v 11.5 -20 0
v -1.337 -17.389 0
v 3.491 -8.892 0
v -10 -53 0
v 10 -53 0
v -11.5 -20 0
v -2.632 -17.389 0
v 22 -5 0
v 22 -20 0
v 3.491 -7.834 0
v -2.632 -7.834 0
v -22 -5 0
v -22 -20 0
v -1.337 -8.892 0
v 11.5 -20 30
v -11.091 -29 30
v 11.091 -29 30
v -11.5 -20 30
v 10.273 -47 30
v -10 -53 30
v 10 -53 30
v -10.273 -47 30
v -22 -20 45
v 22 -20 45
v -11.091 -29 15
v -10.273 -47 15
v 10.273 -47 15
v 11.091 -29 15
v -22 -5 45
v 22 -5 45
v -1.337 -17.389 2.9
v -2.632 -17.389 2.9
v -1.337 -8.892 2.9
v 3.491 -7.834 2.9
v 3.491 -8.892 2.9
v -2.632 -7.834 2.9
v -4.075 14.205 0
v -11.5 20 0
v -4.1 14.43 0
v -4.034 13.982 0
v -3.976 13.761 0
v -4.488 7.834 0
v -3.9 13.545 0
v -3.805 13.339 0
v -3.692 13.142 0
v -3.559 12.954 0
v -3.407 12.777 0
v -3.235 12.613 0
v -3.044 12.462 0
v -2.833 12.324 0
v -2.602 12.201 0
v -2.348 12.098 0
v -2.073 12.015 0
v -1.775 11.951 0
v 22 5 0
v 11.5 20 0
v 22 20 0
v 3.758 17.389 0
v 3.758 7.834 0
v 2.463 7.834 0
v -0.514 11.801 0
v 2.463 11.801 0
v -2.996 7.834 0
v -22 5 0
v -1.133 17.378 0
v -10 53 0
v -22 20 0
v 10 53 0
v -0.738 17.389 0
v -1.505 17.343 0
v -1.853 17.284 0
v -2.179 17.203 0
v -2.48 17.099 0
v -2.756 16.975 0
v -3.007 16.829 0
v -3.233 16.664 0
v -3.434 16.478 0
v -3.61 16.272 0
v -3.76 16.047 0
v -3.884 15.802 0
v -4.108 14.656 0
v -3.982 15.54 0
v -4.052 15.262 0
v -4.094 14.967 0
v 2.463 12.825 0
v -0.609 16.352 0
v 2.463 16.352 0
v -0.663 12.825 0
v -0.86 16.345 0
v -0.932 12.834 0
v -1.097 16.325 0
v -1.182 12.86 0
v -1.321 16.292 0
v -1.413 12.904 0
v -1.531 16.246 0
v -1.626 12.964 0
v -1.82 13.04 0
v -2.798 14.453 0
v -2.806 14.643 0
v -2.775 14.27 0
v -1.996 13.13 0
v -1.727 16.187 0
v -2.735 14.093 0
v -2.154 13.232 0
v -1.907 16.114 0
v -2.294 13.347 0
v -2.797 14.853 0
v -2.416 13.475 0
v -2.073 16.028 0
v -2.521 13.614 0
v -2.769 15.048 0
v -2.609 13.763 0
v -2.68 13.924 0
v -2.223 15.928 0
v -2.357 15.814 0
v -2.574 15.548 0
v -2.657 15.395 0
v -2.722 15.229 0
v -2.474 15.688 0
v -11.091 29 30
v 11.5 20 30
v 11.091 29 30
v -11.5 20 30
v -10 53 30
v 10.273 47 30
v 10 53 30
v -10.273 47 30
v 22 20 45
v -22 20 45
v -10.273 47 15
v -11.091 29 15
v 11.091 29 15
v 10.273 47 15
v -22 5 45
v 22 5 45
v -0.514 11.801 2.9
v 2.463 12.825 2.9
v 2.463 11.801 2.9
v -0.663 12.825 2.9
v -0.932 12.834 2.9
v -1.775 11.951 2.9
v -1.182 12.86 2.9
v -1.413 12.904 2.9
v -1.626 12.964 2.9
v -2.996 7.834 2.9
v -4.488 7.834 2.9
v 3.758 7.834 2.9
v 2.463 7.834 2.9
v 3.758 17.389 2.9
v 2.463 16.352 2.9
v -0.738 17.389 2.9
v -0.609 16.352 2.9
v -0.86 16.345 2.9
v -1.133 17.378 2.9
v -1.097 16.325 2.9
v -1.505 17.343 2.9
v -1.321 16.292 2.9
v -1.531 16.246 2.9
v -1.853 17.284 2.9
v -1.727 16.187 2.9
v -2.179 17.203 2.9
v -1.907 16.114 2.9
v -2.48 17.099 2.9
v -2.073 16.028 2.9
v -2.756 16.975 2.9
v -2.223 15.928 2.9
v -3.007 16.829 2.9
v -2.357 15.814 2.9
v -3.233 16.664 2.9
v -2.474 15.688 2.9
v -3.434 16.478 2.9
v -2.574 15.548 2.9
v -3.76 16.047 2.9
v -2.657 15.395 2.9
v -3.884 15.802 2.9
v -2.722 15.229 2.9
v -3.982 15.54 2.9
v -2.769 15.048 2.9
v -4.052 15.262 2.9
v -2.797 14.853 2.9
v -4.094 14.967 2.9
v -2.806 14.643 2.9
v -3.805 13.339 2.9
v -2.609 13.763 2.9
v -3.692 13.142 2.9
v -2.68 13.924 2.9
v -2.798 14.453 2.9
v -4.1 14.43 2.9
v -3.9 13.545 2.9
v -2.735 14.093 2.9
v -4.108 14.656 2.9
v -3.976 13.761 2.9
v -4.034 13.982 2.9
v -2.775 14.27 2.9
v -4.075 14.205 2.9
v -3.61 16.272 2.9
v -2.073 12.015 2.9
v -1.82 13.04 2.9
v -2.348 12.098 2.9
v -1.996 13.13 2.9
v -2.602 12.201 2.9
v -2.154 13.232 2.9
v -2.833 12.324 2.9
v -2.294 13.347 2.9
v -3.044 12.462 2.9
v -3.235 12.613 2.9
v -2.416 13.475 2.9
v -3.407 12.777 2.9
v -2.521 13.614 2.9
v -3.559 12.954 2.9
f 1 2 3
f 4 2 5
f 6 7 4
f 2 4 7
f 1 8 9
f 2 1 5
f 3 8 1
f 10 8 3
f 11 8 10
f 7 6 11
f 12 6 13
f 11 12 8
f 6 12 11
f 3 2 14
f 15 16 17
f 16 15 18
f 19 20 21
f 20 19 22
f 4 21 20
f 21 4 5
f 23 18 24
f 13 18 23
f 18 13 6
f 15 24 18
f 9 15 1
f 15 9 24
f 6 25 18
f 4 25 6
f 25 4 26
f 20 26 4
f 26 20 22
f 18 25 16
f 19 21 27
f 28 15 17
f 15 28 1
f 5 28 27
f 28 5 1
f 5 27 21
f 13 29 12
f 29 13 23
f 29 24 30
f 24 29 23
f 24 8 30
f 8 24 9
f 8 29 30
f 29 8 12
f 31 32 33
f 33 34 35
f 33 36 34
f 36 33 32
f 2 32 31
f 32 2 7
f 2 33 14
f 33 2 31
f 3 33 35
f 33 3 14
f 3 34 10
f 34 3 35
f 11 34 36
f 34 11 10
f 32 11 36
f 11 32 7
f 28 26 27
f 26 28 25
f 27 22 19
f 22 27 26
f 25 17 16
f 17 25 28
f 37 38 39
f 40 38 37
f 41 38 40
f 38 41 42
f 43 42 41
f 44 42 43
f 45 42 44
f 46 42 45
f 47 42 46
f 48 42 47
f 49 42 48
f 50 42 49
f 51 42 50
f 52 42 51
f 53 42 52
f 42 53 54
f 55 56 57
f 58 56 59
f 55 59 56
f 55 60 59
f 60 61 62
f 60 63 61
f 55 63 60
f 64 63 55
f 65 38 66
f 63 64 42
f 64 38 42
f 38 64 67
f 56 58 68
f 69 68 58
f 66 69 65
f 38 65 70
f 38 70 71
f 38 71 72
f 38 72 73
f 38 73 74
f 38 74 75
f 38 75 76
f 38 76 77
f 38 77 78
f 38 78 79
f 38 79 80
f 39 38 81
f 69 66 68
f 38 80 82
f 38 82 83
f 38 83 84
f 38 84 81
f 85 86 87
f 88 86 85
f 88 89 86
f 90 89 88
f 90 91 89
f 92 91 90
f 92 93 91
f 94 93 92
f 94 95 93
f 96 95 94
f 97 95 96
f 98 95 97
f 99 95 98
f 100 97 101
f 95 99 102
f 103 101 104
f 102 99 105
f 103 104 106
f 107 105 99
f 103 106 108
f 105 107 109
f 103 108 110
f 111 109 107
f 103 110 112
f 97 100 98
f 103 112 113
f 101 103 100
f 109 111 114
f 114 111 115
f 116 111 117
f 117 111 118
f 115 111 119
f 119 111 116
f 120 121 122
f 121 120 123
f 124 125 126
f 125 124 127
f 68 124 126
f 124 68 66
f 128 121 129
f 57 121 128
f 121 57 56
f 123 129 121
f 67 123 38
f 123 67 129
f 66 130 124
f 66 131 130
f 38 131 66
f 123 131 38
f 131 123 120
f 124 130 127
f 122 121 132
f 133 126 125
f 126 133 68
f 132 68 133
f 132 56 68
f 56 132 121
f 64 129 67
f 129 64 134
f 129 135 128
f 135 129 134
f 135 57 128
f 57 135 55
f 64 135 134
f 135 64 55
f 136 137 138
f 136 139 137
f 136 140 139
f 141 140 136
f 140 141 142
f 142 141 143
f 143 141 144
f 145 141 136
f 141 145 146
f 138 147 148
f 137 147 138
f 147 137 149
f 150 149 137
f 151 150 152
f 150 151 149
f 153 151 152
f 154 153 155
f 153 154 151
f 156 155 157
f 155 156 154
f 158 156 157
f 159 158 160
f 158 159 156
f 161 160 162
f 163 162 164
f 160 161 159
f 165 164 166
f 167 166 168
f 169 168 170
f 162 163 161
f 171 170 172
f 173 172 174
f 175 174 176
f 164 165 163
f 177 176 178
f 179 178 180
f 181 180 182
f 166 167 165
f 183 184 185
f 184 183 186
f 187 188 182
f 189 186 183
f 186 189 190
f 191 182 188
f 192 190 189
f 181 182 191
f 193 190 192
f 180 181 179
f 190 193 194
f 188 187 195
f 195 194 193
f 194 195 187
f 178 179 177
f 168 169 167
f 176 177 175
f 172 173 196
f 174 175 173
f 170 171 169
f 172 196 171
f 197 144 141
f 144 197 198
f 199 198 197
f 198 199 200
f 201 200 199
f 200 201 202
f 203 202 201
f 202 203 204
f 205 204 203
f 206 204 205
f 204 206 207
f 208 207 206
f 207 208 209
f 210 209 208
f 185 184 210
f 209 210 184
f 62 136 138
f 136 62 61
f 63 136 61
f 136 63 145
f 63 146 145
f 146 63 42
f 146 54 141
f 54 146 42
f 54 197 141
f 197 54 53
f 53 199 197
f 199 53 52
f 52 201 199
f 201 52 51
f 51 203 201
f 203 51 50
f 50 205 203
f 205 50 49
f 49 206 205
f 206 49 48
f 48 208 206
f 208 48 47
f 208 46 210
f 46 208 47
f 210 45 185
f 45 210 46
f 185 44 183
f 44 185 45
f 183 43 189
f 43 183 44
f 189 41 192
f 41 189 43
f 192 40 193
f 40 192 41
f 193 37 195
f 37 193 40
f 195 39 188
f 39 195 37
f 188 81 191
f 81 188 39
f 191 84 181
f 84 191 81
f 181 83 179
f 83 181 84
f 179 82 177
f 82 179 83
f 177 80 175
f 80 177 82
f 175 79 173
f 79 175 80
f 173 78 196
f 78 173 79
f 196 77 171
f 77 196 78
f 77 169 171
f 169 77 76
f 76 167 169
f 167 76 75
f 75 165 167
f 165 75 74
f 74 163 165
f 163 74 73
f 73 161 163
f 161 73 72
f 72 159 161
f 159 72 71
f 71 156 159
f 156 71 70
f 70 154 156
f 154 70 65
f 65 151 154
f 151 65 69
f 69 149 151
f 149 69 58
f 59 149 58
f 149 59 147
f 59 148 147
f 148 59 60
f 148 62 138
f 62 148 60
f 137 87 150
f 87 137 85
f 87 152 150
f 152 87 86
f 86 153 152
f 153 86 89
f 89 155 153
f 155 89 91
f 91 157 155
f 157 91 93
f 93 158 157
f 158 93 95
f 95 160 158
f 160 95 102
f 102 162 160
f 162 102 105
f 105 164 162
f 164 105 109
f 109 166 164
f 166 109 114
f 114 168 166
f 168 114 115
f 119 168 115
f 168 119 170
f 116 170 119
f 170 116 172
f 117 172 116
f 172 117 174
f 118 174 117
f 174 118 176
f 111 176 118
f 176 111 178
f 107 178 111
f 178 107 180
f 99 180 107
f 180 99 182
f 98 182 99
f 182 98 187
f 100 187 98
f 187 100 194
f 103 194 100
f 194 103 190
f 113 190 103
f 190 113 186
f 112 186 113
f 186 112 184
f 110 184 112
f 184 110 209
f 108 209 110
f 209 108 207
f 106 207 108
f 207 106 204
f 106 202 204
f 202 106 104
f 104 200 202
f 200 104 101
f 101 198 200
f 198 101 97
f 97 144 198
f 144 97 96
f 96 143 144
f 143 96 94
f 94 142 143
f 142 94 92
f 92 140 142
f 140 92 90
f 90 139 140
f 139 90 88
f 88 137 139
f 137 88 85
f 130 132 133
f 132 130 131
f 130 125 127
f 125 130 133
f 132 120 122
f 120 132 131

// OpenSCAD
// all values in mm

HEIGHT = 45;
DEPTH1 = 15;

// few from top, where the letters L/R are:
// width is in the writing direction of letters L/R
WIDTH1 = 10.5;              // distance from left edge to wedge
WIDTH2 = 10.5;              // distance from wedge to right edge
WEDGE_WIDTH = 20;           // width of top of wedge
WEDGE_WIDTH_SLOPE1 = 1.5;   // left width of slope
WEDGE_WIDTH_SLOPE2 = 1.5;   // right width of slope

WEDGE_DEPTH =  33;

WEDGE_HEIGHT = 30;

SHACKLE_DEPTH = 6;
SHACKLE_GAP = 18;
SHACKLE_HEIGHT = 15;

TEXT_DEPTH = 3;
FONT_SIZE = 10;

// distance between the two parts for printing at the same time
DISTANCE = 5;

/* * * * * * * * * * * * */


// total width of the box part (where the letter L/R is printed on)
width = WIDTH1 + WEDGE_WIDTH_SLOPE1 + WEDGE_WIDTH + WEDGE_WIDTH_SLOPE2 + WIDTH2;


window_holder(is_left=true);

window_holder(is_left=false);



module window_holder(is_left) {
    sign = is_left ? -1: 1;
    translate([width/2., sign * DISTANCE, HEIGHT])
        rotate([180, 0, 180])
            mirror_if_left(is_left)
                difference() {
                    union() {
                        cube([width, DEPTH1, HEIGHT]);

                        translate([WIDTH2, DEPTH1, HEIGHT - WEDGE_HEIGHT])
                            prisma_trapez(WEDGE_WIDTH_SLOPE1, WEDGE_WIDTH_SLOPE2, WEDGE_WIDTH, WEDGE_DEPTH, WEDGE_HEIGHT);
                    }

                    letter(is_left);

                    translate([0., DEPTH1 + WEDGE_DEPTH - SHACKLE_GAP - SHACKLE_DEPTH, HEIGHT - WEDGE_HEIGHT - SHACKLE_HEIGHT])
                        cube([width, SHACKLE_GAP, 2 * SHACKLE_HEIGHT]);
                }
}

module mirror_if_left(is_left) {
    if(is_left)
        mirror([0., 1., 0.])
            children();
    else
        children();
}

module letter(is_left=true) {
    lr_letter = is_left ? "L" : "R";
    flip_it = is_left ? 180. : 0.;

    translate([width/ 2., DEPTH1 / 2., HEIGHT - TEXT_DEPTH + 0.1])
        linear_extrude(TEXT_DEPTH)
            mirror_if_left(is_left)  // stupid workaround to mirror back the letter again
                rotate([0., 0., flip_it])
                    text(lr_letter, FONT_SIZE, "Arial", valign="center", halign="center");
}


module prisma_trapez(width_slope1, width_slope2, width_short, depth, height) {
    /*
     * width_slope1: left width of the slop part
     * width_slope2: right width of the slop part
     * width_short:  width of the part without slope
     */
    width_long = width_slope1 + width_slope2 + width_short;

    difference() {
        cube([width_long, depth, height]);
        alpha1 = atan(width_slope1 / depth);
        translate([width_long, 0., -height])
            rotate([0., 0., alpha1])
                cube([width_long, 2 * depth, 3 * height]);

        alpha2 = atan(width_slope2 / depth);
        translate([0., 0., -height])
            mirror([1., 0., 0.])
                rotate([0., 0., alpha2])
                    cube([width_long, 2 * depth, 3 * height]);
    }
}
